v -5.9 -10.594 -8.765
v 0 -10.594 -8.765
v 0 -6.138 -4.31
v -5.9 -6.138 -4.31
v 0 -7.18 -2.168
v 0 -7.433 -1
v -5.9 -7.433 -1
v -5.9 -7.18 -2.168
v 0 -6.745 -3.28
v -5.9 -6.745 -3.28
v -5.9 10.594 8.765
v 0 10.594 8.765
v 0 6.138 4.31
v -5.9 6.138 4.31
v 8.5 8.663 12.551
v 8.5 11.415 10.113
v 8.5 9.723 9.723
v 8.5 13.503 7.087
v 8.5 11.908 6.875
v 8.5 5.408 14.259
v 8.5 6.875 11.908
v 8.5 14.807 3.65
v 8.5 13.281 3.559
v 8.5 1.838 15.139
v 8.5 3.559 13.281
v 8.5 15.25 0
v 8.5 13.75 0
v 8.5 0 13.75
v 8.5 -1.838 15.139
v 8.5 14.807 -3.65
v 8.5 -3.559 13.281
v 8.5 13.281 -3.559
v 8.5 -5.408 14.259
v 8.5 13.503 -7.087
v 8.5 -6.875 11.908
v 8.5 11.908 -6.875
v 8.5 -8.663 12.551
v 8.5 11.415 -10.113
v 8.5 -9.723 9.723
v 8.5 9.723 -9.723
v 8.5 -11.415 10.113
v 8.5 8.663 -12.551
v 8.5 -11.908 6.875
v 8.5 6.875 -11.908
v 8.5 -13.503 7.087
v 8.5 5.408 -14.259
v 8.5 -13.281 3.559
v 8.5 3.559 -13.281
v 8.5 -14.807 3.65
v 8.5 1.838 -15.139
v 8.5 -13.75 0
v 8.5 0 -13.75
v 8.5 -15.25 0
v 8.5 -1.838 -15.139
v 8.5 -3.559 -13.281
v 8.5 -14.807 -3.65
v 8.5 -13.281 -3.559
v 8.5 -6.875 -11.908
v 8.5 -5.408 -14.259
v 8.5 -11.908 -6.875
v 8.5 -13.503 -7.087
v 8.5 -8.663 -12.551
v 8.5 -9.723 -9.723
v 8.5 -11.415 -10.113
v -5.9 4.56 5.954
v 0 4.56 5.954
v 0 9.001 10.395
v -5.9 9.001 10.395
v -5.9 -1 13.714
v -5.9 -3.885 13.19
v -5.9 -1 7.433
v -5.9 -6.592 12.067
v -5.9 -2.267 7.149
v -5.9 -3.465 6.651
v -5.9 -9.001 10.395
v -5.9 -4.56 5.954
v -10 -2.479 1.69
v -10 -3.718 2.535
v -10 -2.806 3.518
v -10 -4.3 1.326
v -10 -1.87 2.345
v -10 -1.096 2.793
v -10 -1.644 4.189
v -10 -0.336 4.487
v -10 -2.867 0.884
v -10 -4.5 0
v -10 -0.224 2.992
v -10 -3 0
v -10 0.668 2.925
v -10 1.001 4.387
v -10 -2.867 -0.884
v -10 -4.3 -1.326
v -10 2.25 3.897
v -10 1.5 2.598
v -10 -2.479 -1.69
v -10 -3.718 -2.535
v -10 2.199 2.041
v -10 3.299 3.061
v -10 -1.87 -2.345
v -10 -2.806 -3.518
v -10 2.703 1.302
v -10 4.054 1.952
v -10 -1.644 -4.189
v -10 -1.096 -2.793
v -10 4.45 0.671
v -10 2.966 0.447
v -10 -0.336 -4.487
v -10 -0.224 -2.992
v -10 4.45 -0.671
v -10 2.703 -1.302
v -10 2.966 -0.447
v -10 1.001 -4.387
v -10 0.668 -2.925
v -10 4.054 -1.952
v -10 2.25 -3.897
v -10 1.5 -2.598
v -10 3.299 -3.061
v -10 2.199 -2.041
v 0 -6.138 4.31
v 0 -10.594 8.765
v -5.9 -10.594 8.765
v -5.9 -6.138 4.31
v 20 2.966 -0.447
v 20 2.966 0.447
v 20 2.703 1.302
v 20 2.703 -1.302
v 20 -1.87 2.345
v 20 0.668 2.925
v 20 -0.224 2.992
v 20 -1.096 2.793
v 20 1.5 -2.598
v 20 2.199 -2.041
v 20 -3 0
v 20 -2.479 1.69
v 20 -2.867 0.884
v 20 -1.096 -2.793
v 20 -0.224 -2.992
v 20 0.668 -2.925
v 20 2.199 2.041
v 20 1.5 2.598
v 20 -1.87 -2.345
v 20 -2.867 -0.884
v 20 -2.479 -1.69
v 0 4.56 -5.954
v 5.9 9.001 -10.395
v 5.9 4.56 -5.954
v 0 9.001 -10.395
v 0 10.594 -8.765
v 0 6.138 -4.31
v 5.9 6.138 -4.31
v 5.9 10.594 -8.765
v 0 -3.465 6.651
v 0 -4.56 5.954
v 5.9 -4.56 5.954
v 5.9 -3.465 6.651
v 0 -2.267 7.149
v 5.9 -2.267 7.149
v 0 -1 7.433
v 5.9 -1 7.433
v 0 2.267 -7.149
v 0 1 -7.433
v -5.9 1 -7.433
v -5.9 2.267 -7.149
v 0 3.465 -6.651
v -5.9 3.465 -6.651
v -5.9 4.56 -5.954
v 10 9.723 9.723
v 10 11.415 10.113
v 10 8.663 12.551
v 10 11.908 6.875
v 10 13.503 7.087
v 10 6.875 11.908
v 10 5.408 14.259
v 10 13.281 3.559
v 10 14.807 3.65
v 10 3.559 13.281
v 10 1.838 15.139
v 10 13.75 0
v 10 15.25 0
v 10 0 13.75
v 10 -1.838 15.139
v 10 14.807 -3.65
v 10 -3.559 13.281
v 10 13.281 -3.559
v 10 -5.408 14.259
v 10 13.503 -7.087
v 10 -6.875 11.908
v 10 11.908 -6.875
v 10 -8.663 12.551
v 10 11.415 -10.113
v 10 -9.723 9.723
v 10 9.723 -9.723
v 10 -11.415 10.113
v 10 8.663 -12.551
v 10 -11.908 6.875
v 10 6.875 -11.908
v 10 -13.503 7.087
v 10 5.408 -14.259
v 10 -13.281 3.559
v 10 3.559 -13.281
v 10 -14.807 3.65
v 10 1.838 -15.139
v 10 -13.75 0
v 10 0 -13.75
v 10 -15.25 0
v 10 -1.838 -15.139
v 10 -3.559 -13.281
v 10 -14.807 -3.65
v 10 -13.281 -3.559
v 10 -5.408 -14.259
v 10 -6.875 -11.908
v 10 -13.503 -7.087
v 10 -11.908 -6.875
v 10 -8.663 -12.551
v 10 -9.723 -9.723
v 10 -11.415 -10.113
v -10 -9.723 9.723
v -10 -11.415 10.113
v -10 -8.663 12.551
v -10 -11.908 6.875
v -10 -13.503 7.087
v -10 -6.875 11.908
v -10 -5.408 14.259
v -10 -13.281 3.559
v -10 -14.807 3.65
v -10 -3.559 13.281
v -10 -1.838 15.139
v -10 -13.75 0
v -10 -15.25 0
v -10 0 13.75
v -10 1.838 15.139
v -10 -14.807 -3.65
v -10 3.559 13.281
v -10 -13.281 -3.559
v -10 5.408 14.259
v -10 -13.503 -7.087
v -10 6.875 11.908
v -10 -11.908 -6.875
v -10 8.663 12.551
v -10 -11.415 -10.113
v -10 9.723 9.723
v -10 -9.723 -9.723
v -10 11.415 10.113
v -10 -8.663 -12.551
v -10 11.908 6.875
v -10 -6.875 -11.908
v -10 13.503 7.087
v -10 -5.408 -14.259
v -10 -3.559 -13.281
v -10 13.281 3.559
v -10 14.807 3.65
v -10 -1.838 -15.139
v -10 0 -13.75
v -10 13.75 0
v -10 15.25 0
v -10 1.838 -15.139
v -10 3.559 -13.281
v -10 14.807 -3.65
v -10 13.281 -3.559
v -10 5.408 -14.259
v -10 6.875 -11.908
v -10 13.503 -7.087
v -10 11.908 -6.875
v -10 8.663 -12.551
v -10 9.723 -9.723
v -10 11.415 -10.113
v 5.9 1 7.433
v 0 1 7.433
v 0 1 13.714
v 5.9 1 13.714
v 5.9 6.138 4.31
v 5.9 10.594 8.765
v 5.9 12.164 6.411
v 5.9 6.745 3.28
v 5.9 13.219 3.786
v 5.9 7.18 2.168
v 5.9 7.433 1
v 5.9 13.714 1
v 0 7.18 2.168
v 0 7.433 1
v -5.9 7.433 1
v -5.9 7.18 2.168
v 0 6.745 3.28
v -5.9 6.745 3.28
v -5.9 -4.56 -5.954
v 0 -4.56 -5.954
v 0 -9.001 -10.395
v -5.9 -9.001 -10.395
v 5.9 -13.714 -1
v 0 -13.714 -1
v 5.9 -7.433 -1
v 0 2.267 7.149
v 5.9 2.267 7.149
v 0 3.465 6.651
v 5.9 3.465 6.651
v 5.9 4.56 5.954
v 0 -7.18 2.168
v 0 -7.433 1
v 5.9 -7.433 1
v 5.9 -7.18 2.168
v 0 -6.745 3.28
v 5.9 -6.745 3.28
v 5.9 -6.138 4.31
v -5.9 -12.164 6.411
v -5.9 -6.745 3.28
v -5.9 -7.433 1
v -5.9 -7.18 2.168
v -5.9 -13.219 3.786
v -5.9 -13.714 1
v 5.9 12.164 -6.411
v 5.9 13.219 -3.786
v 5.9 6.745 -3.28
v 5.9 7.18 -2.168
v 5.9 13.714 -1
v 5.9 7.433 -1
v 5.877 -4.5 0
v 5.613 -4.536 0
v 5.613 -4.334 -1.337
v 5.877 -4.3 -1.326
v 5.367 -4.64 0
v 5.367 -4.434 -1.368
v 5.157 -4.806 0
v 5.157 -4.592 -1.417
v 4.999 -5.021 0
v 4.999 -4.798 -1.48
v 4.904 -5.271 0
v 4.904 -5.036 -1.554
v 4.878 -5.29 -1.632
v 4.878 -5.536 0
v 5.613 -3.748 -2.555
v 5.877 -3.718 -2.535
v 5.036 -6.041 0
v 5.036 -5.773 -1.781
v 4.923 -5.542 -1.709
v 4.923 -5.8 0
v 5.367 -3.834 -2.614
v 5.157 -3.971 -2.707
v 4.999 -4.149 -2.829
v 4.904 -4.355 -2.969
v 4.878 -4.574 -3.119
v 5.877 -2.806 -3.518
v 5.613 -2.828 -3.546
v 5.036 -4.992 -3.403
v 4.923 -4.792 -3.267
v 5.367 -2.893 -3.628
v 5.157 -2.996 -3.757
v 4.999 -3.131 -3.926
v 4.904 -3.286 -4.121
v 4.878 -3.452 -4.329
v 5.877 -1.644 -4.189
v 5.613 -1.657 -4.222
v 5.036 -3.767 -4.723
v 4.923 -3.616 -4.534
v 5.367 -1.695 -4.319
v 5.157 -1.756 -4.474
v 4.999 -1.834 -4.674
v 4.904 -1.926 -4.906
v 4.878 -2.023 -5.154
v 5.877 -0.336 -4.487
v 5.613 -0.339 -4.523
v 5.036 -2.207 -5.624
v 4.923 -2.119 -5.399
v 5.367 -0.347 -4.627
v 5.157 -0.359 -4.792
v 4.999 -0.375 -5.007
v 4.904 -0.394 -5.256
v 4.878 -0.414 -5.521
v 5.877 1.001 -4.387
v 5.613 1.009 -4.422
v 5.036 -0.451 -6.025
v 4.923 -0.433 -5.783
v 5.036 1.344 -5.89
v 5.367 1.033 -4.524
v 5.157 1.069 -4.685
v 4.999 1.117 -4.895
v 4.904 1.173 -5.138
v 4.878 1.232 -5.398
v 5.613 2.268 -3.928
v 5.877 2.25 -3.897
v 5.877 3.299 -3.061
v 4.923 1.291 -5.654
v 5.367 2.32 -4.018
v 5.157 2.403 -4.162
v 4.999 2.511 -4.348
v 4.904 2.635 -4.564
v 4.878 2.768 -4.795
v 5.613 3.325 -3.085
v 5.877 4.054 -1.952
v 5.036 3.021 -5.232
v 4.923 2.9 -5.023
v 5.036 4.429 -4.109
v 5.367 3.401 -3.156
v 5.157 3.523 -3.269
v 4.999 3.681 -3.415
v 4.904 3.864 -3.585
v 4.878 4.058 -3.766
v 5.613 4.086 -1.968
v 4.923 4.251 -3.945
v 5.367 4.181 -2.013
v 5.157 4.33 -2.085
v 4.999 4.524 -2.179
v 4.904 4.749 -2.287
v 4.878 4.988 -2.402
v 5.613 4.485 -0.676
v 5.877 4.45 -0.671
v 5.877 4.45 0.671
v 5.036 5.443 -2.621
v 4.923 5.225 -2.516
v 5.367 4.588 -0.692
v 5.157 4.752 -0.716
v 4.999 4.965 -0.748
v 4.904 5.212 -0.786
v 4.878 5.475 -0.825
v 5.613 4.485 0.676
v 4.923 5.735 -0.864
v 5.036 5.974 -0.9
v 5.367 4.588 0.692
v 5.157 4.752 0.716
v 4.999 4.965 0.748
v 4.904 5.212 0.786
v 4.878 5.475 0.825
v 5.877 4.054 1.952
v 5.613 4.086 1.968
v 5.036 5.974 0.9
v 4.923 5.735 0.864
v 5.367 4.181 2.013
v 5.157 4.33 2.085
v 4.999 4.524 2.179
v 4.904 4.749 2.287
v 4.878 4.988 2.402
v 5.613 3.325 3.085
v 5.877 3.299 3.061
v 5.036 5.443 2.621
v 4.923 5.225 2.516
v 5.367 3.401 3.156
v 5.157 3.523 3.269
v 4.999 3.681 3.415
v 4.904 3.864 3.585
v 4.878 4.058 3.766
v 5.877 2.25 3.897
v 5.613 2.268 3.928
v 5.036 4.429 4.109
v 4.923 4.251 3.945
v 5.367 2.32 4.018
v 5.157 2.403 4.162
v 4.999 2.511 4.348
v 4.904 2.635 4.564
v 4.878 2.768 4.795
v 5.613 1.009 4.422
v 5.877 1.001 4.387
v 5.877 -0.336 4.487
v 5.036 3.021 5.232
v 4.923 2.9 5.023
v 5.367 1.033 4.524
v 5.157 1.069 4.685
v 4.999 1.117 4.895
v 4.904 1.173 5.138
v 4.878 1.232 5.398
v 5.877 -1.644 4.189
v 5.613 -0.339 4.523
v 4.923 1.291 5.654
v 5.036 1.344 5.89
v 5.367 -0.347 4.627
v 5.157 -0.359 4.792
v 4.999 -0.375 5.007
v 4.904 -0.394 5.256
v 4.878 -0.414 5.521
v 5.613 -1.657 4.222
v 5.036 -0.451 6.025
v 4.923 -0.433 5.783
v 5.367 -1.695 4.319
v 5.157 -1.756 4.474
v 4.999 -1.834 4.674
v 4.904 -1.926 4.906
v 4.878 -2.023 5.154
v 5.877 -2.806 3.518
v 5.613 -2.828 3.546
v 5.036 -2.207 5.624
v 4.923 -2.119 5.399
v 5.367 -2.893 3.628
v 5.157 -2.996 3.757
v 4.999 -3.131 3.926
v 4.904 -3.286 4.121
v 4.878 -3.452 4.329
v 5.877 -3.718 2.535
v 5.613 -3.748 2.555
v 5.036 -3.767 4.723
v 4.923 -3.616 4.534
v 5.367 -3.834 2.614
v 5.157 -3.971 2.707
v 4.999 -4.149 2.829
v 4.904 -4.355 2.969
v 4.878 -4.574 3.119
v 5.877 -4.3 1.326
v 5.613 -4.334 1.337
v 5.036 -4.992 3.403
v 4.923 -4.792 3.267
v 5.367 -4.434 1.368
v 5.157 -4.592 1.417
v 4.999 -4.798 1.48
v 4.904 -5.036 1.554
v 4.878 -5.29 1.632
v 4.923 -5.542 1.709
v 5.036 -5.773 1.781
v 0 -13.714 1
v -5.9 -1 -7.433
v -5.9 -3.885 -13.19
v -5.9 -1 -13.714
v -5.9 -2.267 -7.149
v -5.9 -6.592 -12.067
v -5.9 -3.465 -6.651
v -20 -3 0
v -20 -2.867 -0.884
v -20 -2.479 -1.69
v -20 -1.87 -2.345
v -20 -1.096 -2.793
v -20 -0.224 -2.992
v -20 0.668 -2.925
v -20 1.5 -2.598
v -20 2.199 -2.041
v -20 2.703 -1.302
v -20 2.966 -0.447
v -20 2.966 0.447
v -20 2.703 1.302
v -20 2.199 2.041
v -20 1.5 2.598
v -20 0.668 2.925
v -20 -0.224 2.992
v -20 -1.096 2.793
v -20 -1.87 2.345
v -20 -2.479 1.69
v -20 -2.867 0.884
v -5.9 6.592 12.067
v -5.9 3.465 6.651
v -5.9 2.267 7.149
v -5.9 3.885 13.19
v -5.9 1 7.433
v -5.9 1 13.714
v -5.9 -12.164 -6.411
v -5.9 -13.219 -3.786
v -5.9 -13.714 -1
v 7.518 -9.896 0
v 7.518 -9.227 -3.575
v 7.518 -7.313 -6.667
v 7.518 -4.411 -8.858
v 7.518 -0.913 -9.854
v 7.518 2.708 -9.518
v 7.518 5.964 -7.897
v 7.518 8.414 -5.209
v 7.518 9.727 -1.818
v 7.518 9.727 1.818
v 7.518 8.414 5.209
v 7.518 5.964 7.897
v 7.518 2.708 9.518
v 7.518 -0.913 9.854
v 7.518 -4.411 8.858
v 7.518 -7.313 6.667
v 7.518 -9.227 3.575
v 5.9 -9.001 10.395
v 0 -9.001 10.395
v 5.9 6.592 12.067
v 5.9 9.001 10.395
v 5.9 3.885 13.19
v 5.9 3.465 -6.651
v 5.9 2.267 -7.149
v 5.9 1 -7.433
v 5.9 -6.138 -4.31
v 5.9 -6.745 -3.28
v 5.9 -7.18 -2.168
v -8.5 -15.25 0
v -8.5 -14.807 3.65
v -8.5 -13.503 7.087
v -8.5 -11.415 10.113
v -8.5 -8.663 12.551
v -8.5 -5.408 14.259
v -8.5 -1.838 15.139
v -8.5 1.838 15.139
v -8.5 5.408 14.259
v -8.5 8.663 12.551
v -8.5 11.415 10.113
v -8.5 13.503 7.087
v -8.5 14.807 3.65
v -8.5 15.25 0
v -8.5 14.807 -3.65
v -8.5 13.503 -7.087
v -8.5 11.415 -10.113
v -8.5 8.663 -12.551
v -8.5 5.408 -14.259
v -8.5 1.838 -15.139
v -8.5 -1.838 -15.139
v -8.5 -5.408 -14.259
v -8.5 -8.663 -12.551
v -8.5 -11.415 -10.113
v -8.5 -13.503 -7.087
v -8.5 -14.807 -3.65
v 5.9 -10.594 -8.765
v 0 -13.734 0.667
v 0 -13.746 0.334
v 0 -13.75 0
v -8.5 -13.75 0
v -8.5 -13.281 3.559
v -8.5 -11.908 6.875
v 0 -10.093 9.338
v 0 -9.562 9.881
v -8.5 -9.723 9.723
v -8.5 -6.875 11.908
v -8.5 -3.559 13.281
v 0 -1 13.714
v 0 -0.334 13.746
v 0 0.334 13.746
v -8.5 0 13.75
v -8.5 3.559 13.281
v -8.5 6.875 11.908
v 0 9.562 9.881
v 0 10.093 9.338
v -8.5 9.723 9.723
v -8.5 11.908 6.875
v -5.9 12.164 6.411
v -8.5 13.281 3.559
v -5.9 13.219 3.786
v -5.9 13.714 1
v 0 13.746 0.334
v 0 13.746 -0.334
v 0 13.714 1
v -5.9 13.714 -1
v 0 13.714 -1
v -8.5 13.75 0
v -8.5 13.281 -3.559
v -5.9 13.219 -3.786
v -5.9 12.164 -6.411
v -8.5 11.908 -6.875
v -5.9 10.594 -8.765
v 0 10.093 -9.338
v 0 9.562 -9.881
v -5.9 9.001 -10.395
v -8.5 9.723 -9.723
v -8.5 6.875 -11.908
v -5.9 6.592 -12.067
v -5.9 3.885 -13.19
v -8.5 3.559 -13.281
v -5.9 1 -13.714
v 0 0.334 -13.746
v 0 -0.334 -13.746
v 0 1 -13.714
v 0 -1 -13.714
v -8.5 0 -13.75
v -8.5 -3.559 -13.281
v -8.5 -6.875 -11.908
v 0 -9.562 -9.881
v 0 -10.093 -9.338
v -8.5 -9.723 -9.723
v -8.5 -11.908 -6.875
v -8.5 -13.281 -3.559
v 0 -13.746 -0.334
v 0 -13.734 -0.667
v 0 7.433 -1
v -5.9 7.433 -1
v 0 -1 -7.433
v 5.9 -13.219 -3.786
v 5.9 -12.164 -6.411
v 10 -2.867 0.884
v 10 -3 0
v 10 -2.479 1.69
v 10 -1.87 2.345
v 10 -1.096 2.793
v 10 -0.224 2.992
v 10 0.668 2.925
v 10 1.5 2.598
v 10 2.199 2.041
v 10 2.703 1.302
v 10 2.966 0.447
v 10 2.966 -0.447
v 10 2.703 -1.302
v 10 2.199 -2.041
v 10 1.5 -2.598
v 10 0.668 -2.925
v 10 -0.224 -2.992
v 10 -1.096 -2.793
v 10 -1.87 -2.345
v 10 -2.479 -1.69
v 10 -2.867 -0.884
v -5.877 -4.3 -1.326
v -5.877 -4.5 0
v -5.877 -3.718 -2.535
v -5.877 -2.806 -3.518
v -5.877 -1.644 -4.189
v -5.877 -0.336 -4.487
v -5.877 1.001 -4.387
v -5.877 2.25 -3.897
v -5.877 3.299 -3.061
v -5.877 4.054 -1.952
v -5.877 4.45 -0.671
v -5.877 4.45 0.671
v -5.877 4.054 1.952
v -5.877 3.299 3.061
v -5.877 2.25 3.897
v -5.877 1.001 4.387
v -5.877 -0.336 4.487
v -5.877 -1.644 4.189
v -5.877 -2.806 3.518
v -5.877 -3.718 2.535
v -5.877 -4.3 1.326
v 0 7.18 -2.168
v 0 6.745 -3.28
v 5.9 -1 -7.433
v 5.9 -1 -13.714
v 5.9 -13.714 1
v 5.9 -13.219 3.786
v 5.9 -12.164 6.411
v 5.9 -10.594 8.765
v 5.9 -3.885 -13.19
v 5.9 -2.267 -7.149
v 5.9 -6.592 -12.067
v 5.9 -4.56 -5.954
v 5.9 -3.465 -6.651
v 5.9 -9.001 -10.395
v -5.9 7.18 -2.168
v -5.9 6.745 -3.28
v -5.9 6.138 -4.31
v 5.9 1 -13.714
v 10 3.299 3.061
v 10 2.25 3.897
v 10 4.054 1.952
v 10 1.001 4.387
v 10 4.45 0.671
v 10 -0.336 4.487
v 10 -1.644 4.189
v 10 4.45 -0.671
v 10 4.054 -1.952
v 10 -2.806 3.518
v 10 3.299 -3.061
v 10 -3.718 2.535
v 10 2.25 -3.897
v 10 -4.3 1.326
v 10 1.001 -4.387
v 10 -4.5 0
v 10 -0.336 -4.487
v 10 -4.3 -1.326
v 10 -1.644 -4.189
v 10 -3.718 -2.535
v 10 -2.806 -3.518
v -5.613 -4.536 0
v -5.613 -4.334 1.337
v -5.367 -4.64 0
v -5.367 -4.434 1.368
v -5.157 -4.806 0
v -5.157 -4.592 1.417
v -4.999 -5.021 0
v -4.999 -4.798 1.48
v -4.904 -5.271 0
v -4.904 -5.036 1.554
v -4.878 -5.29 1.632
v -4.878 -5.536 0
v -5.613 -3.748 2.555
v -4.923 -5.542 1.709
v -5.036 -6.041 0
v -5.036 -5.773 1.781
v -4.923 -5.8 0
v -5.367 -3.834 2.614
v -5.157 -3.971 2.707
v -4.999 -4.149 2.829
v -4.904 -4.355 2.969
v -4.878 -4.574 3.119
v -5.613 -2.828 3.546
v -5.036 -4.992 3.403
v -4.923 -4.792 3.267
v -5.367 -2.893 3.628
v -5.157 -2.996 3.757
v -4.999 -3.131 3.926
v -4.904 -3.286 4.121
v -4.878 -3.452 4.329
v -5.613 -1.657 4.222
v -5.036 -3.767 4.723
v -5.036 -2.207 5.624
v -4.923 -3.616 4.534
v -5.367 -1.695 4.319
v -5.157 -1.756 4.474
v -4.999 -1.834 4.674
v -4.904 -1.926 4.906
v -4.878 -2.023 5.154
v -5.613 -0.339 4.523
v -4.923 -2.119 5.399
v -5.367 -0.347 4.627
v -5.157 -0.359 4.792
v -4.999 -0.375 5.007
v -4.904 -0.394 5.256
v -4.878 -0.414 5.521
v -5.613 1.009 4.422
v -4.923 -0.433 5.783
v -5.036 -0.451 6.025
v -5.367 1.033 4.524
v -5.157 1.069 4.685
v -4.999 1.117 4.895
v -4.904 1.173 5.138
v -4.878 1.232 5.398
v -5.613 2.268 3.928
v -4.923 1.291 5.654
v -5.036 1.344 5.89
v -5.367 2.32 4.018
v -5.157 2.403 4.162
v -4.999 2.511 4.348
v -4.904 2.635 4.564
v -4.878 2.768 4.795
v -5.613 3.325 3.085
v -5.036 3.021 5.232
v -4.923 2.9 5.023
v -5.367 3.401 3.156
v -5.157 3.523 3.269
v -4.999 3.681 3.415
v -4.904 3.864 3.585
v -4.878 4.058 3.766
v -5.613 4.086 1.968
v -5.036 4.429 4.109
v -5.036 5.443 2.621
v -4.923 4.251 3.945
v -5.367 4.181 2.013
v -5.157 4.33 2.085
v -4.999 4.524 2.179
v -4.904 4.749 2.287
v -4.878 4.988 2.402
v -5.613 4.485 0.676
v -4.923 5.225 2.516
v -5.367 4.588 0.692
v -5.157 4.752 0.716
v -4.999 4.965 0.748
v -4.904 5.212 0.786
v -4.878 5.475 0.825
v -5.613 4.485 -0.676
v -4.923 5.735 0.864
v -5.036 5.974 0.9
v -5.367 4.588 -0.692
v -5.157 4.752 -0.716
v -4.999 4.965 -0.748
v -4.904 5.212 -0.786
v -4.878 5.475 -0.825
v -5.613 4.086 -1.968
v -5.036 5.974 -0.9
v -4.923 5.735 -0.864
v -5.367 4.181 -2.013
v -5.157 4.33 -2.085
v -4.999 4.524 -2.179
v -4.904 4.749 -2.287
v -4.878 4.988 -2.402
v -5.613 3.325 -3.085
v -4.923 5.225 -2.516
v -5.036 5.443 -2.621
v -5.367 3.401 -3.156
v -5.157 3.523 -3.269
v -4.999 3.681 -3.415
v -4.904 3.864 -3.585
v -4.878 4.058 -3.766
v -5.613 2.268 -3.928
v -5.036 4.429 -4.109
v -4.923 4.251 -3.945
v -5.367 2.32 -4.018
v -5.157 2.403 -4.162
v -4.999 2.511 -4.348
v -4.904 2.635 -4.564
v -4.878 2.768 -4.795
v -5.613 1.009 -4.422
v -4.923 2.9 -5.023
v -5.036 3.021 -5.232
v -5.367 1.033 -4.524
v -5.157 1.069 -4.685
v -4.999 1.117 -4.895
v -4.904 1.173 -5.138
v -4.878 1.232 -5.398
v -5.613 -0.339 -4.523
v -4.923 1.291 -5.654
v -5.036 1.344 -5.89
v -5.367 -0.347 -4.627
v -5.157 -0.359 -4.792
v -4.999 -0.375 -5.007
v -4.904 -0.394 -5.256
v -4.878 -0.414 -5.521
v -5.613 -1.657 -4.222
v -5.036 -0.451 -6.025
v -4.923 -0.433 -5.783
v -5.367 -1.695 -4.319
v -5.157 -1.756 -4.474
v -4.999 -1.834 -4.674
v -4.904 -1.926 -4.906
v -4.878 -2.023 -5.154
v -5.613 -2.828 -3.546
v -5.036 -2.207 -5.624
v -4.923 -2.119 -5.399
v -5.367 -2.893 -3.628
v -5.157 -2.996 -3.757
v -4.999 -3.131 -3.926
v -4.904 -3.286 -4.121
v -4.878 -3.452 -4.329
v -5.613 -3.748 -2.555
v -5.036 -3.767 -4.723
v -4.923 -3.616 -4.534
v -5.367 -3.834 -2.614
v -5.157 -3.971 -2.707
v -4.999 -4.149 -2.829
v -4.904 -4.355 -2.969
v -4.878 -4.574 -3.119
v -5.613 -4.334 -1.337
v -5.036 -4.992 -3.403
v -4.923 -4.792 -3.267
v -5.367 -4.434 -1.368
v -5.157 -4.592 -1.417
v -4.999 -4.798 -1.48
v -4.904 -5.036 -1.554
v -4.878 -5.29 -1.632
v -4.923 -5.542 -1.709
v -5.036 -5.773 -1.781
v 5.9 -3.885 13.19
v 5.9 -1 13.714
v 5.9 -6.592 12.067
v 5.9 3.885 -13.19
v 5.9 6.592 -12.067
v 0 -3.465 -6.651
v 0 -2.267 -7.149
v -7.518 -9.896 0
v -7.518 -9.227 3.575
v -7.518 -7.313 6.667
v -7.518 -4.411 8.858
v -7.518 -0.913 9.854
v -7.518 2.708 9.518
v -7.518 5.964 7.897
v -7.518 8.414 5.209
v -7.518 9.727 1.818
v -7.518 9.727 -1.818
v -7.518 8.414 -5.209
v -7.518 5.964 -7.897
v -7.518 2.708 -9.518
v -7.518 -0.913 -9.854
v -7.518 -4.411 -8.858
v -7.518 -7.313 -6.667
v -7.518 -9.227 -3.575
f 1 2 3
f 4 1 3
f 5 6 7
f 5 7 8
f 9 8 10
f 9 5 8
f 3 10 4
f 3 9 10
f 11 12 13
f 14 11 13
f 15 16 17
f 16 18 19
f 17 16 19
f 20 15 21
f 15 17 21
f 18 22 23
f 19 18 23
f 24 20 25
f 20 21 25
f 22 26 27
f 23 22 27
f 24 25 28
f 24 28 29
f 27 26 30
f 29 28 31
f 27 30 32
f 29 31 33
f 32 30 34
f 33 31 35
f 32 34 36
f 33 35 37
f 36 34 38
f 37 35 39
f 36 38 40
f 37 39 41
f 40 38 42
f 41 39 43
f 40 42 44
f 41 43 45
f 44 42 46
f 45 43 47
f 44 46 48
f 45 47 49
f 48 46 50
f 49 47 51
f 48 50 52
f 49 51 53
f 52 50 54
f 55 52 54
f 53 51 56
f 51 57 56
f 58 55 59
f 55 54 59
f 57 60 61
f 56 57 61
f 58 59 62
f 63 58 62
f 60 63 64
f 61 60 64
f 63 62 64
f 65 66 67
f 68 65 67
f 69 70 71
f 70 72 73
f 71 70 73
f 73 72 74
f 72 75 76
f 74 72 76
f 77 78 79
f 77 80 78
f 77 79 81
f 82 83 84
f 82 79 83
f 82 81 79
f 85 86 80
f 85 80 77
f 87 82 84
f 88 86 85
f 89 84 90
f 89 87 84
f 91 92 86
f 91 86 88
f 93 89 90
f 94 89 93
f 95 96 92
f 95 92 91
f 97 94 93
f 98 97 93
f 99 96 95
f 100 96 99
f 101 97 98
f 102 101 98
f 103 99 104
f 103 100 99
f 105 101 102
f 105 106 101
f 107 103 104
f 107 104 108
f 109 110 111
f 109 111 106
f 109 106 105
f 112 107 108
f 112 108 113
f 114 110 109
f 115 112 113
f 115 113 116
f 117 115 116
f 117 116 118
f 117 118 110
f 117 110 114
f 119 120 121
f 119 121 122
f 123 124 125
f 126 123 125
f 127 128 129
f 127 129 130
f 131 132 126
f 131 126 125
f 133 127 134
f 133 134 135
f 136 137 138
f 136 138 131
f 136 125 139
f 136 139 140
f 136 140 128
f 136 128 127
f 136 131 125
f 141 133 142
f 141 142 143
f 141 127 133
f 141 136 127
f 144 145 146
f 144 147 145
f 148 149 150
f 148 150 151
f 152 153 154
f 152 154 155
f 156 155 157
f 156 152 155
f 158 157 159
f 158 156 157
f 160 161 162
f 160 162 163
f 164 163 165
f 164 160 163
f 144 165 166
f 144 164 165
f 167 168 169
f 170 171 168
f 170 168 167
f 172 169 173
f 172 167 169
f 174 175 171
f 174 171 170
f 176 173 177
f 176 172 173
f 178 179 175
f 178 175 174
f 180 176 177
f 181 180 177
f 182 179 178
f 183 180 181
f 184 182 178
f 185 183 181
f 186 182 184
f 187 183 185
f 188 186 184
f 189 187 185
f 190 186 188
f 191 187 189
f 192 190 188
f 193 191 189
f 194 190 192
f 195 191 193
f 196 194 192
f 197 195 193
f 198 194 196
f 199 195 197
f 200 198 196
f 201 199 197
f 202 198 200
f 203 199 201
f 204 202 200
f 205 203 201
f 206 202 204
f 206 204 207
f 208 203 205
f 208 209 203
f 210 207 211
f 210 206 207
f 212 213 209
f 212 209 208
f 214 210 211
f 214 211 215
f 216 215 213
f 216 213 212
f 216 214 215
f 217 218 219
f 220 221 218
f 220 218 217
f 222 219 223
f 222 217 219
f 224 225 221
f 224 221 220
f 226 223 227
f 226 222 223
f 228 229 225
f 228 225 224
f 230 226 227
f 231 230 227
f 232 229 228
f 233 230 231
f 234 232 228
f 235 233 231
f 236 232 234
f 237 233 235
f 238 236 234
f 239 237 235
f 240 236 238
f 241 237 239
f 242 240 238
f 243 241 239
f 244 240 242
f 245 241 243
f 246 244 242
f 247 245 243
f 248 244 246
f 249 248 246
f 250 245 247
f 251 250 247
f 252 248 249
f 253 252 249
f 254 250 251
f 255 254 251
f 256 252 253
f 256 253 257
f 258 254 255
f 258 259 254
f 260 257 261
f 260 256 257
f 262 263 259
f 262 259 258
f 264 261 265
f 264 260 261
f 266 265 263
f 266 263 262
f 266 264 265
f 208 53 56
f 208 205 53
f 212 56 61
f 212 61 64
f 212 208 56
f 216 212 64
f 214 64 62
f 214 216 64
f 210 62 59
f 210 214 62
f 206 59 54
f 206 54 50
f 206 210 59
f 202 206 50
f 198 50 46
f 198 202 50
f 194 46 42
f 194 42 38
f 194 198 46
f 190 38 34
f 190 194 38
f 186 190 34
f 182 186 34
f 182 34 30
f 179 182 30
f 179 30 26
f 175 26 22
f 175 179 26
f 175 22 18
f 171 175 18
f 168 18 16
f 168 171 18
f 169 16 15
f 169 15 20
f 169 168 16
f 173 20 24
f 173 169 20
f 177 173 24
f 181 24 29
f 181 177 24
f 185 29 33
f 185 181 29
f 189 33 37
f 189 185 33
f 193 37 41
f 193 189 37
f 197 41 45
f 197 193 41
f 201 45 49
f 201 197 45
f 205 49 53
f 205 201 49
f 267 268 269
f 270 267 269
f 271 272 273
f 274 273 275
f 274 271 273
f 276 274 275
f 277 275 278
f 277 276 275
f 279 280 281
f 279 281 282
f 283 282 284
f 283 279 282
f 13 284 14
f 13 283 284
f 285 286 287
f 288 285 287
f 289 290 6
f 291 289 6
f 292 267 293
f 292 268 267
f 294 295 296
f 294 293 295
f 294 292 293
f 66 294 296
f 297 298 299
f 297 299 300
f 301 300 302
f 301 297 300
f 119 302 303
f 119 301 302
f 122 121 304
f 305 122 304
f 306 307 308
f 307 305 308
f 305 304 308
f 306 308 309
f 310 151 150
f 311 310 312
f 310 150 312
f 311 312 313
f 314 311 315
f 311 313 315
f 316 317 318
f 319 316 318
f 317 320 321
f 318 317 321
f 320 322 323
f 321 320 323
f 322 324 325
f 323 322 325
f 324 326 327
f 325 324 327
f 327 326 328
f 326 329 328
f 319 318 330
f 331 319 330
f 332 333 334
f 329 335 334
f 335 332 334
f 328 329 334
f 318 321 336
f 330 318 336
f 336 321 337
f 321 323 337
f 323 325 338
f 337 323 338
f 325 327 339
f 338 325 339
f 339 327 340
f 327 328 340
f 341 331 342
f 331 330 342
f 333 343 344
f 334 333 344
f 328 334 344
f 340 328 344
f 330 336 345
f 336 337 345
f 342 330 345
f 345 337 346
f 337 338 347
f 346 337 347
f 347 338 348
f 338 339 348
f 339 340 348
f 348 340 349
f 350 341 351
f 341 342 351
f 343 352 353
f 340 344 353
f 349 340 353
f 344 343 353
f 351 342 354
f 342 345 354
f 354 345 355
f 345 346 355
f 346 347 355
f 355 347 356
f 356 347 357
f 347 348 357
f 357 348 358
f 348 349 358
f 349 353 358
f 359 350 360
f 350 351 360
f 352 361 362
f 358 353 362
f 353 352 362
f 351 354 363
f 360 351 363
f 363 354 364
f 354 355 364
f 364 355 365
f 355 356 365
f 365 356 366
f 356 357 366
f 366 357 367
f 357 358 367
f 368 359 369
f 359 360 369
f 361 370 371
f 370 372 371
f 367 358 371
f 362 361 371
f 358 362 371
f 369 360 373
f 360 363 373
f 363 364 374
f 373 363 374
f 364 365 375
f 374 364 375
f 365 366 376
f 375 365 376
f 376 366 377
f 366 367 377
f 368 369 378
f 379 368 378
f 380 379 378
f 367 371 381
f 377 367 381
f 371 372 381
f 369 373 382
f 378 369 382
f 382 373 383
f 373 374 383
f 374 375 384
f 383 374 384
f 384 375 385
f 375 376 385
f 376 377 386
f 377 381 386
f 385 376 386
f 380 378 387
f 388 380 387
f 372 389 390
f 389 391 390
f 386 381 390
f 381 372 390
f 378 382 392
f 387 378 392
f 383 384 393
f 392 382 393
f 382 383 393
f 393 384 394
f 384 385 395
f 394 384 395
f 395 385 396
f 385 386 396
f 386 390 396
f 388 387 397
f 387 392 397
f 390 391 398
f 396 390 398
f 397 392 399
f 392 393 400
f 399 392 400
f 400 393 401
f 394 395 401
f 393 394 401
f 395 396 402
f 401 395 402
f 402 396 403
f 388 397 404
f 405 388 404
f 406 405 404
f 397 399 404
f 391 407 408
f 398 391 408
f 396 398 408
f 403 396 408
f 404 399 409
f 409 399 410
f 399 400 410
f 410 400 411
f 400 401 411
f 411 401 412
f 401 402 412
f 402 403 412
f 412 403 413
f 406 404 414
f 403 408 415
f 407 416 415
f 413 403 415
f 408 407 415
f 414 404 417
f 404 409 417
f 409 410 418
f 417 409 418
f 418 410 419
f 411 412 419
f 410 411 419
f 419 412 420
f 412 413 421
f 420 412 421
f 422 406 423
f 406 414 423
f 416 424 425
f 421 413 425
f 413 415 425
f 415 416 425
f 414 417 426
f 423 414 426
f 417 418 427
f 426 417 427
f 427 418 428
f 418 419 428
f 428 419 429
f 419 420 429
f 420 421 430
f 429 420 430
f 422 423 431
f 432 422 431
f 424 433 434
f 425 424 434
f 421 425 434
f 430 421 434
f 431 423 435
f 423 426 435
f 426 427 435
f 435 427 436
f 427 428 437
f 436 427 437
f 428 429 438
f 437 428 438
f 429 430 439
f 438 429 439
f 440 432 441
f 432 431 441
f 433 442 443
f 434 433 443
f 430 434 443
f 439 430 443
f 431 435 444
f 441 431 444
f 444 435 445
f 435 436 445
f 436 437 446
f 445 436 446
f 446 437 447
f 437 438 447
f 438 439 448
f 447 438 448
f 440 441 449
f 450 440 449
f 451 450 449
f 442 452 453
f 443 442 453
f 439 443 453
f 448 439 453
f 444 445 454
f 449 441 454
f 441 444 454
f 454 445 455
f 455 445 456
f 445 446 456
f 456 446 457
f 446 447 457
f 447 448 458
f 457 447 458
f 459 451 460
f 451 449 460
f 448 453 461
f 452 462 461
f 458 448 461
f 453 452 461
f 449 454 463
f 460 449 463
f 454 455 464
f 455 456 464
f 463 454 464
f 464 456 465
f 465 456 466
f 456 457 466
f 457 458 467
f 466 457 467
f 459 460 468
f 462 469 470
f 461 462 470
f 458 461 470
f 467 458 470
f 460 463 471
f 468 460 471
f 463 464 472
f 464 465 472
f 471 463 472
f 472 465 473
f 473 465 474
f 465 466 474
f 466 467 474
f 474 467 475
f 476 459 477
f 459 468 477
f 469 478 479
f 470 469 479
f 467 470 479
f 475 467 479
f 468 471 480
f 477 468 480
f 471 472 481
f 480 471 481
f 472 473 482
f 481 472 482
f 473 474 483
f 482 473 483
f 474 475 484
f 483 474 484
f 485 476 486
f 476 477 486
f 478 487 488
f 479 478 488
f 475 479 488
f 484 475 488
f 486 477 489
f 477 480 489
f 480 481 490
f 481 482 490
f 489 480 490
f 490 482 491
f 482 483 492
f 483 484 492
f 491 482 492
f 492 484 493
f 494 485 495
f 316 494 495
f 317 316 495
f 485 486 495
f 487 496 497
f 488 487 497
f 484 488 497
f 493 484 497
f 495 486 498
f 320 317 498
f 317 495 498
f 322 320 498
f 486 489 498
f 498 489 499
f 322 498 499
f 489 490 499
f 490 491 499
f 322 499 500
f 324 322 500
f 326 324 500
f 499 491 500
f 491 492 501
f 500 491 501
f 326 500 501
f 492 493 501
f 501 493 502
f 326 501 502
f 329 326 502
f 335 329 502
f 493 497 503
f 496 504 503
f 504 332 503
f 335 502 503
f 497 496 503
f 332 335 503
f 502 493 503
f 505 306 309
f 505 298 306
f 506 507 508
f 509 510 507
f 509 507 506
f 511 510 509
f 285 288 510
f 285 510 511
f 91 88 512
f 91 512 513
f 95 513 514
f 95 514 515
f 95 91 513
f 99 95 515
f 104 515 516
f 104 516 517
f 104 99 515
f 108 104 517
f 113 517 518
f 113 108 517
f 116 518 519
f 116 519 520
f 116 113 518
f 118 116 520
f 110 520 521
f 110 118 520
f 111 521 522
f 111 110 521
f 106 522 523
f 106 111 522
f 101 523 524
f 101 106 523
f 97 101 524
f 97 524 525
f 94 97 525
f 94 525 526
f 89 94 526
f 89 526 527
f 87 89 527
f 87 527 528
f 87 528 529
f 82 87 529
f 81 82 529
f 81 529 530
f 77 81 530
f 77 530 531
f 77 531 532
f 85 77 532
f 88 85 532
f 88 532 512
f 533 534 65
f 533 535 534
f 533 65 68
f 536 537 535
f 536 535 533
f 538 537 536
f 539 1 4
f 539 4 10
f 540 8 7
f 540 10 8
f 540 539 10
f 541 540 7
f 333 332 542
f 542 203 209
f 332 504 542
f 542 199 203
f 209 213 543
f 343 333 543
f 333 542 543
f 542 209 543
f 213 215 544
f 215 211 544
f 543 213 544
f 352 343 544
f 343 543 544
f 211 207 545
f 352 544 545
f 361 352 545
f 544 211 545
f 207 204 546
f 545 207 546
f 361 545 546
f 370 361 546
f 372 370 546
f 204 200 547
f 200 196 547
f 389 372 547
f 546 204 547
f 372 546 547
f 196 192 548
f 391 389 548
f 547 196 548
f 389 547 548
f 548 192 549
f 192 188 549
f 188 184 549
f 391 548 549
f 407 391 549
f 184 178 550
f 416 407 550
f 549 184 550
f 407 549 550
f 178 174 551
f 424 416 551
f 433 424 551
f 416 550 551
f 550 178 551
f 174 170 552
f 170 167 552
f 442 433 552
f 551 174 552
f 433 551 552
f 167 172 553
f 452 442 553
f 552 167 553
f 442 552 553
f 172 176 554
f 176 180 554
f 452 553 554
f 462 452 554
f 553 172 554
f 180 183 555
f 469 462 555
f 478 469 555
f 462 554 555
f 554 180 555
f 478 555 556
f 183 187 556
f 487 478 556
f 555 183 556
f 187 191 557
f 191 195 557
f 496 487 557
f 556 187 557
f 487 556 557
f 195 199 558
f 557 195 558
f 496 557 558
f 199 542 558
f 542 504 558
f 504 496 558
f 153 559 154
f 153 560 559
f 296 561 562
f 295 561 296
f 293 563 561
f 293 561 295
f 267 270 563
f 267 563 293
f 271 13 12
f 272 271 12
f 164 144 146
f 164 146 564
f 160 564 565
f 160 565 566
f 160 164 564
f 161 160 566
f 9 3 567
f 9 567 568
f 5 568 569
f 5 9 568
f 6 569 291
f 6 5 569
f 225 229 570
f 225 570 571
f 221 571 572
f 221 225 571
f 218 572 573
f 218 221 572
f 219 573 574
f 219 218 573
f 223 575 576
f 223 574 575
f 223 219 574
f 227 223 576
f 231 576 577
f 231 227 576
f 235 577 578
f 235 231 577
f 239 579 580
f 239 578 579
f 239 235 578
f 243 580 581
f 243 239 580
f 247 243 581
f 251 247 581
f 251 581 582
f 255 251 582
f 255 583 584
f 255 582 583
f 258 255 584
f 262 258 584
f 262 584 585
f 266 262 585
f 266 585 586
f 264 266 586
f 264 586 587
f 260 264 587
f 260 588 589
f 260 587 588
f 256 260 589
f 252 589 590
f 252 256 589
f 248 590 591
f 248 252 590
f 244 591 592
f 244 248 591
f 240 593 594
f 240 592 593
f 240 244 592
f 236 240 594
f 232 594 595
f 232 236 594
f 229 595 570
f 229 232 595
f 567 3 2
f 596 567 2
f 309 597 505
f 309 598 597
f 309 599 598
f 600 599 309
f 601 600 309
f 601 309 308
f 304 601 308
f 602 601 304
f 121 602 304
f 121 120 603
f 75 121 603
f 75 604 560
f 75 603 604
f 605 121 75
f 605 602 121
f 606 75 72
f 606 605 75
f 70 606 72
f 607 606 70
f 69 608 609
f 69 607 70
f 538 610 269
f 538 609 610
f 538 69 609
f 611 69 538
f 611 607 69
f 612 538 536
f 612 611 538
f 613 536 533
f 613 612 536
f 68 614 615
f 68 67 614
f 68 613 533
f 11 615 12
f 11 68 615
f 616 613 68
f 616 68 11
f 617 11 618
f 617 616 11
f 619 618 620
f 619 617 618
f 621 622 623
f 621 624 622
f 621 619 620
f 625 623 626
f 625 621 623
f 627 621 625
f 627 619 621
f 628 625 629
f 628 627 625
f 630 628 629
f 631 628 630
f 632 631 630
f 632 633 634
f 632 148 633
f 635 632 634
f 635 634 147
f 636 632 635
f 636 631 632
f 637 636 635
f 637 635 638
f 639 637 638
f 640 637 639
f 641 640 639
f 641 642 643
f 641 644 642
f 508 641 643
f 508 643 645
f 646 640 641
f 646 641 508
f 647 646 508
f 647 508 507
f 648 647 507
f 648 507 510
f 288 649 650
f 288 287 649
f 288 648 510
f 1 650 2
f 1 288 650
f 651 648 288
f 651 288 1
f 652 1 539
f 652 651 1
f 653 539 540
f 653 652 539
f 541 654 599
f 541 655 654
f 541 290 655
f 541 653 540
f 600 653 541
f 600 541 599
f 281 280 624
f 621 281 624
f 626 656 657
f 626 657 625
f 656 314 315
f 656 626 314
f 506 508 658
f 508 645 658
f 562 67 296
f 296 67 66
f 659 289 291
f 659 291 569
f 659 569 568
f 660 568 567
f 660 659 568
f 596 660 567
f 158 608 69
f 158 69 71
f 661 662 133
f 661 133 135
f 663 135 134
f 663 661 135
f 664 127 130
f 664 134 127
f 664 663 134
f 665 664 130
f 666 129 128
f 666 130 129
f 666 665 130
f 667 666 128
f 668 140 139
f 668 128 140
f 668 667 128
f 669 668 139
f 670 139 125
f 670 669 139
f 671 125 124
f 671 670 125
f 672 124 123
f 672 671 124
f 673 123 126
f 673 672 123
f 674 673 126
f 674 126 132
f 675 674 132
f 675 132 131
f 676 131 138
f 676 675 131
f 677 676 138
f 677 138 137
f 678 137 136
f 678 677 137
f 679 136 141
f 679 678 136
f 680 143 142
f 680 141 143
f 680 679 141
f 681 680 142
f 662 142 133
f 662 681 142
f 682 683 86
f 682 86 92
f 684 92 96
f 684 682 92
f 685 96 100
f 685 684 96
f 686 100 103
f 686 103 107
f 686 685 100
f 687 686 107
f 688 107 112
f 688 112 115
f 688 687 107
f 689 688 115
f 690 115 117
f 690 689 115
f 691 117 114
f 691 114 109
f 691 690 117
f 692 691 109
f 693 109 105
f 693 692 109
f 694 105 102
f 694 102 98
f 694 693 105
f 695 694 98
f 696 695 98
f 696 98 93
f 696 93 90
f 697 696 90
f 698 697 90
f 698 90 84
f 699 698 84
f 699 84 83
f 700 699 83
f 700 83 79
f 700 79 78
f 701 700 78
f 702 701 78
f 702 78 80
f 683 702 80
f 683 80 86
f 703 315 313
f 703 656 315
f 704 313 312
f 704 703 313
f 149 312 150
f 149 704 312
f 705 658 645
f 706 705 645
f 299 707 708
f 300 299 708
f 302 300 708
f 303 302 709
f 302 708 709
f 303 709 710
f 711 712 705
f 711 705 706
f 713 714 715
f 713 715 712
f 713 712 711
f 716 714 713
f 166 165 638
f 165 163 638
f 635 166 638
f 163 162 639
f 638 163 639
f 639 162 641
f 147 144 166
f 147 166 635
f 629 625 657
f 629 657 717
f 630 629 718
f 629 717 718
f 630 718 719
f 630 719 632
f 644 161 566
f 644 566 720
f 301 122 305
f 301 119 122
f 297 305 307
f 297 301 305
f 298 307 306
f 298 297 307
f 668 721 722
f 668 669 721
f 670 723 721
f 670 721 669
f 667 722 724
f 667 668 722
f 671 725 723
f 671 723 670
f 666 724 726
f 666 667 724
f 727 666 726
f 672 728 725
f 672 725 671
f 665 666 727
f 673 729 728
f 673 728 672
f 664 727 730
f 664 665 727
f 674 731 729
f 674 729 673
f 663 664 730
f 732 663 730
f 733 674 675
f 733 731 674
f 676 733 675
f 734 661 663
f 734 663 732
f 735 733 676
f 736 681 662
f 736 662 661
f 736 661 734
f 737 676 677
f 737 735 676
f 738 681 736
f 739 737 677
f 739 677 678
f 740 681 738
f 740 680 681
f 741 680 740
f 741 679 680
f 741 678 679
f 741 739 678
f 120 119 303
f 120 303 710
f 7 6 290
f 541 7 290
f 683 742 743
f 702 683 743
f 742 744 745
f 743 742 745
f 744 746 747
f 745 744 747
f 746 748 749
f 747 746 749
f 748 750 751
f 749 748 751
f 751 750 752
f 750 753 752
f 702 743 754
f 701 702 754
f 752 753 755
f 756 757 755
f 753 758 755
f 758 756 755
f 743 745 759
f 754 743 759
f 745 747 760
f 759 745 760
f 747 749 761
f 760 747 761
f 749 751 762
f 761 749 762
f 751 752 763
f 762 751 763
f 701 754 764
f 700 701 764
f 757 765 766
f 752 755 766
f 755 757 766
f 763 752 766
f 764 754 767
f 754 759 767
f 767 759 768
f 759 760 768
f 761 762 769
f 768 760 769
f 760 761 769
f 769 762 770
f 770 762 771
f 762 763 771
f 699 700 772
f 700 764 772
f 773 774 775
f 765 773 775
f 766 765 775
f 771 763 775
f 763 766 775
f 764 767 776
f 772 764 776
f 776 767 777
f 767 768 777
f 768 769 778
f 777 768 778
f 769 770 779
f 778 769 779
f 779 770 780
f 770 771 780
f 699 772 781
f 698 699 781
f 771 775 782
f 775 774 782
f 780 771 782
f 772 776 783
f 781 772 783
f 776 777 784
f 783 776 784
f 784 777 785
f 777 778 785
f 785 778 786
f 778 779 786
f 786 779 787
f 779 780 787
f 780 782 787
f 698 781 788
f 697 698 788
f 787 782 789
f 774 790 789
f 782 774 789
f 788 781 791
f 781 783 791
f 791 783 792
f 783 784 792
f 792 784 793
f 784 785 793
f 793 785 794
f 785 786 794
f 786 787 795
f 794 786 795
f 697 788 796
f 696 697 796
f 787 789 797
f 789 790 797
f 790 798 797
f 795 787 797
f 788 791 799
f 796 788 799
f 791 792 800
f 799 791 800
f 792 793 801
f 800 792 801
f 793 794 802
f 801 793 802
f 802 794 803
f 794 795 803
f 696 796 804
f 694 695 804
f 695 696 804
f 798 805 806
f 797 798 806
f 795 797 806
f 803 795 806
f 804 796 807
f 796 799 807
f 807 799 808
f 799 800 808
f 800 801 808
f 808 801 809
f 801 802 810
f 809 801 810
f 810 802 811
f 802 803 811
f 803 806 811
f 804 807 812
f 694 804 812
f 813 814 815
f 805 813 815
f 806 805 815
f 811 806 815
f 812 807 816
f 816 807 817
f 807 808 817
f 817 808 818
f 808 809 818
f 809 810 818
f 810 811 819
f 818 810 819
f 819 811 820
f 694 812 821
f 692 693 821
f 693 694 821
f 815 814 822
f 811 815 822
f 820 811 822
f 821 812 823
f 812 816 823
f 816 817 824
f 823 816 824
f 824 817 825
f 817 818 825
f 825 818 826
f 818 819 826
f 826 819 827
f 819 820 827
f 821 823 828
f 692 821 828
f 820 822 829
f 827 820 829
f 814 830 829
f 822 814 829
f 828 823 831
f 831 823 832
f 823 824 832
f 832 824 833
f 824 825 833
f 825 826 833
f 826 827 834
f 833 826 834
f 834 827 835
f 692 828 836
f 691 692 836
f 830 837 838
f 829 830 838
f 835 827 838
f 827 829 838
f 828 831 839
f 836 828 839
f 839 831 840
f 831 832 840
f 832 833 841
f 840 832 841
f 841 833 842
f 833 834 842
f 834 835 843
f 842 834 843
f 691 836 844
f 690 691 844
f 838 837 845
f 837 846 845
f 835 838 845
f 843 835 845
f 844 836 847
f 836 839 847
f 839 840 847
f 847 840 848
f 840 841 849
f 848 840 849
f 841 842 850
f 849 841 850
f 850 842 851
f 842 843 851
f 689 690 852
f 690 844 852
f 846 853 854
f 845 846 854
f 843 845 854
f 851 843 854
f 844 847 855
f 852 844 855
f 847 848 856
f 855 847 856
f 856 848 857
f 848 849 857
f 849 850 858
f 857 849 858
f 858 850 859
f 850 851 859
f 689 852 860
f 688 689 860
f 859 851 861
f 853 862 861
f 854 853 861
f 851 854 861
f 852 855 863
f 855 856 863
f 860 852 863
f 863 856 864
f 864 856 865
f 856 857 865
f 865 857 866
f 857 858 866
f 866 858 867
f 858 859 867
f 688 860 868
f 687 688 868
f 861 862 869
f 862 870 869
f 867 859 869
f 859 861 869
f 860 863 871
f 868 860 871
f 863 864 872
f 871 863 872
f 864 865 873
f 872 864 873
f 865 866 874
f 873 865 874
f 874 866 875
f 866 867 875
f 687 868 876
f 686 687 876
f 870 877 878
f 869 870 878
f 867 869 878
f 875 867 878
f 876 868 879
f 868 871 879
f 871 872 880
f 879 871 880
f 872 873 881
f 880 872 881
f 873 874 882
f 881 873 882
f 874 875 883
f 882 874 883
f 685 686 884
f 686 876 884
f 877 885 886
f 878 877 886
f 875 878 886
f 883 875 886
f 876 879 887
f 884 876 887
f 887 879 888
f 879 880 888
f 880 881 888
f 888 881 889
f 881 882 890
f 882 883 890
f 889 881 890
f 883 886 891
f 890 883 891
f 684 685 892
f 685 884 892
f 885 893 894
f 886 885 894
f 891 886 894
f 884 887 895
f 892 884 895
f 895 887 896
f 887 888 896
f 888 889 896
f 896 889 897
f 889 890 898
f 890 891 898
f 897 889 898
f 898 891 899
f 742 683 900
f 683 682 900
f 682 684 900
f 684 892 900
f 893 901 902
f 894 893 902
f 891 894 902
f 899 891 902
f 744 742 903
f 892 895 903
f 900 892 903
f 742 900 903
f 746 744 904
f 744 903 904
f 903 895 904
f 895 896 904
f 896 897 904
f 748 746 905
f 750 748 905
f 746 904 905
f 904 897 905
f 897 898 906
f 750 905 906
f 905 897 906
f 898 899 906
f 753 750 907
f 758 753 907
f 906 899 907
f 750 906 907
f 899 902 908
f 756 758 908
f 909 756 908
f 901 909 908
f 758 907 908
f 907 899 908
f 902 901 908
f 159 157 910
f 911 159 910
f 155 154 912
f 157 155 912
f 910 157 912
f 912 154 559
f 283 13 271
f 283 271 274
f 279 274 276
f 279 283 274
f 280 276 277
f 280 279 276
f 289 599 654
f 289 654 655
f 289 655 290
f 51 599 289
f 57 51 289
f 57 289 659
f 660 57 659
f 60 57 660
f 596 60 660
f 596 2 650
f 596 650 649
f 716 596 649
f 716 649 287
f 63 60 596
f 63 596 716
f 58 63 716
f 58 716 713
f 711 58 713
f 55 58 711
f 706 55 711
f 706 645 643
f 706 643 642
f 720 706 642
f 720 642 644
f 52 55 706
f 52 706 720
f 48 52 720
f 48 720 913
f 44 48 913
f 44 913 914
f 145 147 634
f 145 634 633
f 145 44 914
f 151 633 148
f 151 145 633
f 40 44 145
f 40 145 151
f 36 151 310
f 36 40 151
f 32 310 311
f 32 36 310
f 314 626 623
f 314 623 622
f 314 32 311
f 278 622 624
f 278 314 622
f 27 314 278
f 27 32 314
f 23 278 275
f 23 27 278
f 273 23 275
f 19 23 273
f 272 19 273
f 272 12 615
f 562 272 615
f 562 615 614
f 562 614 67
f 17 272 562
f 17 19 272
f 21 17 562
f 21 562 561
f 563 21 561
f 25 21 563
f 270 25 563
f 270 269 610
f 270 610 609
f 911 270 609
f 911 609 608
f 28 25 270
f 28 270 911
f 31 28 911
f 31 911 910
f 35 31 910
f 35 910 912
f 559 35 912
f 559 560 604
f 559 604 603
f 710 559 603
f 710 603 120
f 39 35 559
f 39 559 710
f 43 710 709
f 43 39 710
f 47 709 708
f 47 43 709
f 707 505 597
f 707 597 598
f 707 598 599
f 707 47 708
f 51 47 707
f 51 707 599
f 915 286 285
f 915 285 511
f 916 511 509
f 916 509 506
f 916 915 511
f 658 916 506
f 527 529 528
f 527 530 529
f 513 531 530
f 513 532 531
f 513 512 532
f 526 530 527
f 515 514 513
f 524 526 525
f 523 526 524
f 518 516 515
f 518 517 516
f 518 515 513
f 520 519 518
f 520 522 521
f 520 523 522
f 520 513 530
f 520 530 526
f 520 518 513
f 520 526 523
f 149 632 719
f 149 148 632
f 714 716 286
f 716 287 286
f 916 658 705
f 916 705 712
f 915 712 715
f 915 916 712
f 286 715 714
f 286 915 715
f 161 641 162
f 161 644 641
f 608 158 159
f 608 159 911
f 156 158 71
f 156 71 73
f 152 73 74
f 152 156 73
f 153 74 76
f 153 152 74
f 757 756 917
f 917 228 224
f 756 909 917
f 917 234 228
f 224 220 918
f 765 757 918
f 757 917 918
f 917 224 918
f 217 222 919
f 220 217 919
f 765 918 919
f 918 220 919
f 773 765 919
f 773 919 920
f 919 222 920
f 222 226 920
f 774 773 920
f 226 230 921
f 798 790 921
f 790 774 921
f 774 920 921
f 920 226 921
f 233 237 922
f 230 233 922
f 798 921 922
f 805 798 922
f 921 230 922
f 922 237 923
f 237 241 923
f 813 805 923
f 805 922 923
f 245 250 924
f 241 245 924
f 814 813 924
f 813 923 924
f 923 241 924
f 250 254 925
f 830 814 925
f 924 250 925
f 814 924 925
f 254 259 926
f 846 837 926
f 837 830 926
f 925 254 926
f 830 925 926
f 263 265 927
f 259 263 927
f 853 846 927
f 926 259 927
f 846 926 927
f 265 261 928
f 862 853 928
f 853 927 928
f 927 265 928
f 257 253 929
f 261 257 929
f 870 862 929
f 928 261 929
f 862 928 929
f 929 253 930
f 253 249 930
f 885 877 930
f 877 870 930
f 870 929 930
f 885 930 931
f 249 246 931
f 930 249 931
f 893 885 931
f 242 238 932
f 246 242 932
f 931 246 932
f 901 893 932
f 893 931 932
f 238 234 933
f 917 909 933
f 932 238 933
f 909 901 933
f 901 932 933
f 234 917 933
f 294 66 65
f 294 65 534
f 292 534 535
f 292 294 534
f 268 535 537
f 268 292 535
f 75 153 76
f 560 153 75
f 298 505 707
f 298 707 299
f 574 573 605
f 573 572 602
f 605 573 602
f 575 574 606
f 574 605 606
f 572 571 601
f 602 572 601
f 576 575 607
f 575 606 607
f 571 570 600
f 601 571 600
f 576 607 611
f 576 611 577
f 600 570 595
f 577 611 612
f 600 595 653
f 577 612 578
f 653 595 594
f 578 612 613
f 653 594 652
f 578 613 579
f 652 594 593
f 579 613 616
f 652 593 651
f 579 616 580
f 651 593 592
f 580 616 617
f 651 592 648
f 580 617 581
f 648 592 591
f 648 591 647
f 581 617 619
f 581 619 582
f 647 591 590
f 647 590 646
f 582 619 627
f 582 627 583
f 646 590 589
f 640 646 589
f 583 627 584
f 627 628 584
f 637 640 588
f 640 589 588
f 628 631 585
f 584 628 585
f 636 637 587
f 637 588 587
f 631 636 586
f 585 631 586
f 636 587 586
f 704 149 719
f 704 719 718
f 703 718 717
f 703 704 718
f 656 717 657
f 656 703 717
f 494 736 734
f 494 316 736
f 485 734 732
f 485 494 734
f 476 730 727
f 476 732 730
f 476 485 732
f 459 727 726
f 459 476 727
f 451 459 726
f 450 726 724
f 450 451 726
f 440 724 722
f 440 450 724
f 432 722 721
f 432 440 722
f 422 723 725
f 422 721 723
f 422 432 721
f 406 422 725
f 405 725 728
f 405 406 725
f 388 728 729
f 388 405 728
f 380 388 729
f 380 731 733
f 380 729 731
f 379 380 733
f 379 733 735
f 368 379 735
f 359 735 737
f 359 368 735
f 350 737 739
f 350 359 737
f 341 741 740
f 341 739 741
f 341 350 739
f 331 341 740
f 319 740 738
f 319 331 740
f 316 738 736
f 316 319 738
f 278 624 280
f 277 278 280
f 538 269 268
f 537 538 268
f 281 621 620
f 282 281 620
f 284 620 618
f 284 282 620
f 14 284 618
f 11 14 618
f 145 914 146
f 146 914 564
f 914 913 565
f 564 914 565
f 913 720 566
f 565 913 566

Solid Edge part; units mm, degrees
sketch "Sketch1" plane through (0, 0, 0) normal (0, 0, 1) x (1, 0, 0)
  line L0 (20, -3) -> (10, -3)
  line L1 (10, -3) -> (10, -4.5)
  line L2 (10, -4.5) -> (5.8772, -4.5)
  arc A0 (5.8772, -4.5) -> (5.0365, -6.0414) centre (5.8772, -5.5) ccw
  line L3 (5.0365, -6.0414) -> (10, -13.75)
  line L4 (10, -13.75) -> (10, -15.25)
  line L5 (8.5, -15.25) -> (10, -15.25)
  line L6 (8.5, -13.75) -> (8.5, -15.25)
  line L7 (0, -13.75) -> (8.5, -13.75)
  line L8 (0, 0) -> (0, -13.75)
  line L9 (0, 0) -> (20, 0)
  line L10 (20, 0) -> (20, -3)
revolve "RevolvedProtrusion1" add sketch "Sketch1" angle 360 about axis through (0, 0, 0) along (1, 0, 0)
sketch "Sketch2" plane through (0, 0, 0) normal (-1, 0, 0) x (0, 0, 1)
  line L0 (-7.433, 1) -> (-19.394, 1)
  line L1 (-19.394, 1) -> (-19.394, 18)
  line L2 (-19.394, 18) -> (-5.9543, 4.5603)
  arc A0 (-5.9543, 4.5603) -> (-7.433, 1) centre (0, 0) ccw
  line L3 (-7.433, -1) -> (-19.394, -1)
  line L4 (-19.394, -1) -> (-19.394, -18)
  line L5 (-19.394, -18) -> (-5.9543, -4.5603)
  arc A1 (-5.9543, -4.5603) -> (-7.433, -1) centre (0, 0) cw
  line L6 (-4.3097, -6.1381) -> (-18, -19.8284)
  line L7 (-18, -19.8284) -> (-1, -19.8284)
  line L8 (-1, -19.8284) -> (-1, -7.433)
  arc A2 (-1, -7.433) -> (-4.3097, -6.1381) centre (0, 0) cw
  line L9 (1, -19.8284) -> (1, -7.433)
  arc A3 (1, -7.433) -> (4.3097, -6.1381) centre (0, 0) ccw
  line L10 (4.3097, -6.1381) -> (18, -19.8284)
  line L11 (18, -19.8284) -> (1, -19.8284)
  line L12 (19.394, -18) -> (5.9543, -4.5603)
  arc A4 (5.9543, -4.5603) -> (7.433, -1) centre (0, 0) ccw
  line L13 (7.433, -1) -> (19.394, -1)
  line L14 (19.394, -1) -> (19.394, -18)
  line L15 (7.433, 1) -> (19.394, 1)
  line L16 (19.394, 1) -> (19.394, 18)
  line L17 (19.394, 18) -> (5.9543, 4.5603)
  arc A5 (5.9543, 4.5603) -> (7.433, 1) centre (0, 0) cw
  line L18 (4.3097, 6.1381) -> (18, 19.8284)
  line L19 (18, 19.8284) -> (1, 19.8284)
  line L20 (1, 19.8284) -> (1, 7.433)
  arc A6 (1, 7.433) -> (4.3097, 6.1381) centre (0, 0) cw
  line L21 (-1, 19.8284) -> (-1, 7.433)
  arc A7 (-1, 7.433) -> (-4.3097, 6.1381) centre (0, 0) ccw
  line L22 (-4.3097, 6.1381) -> (-18, 19.8284)
  line L23 (-18, 19.8284) -> (-1, 19.8284)
extrude "Cutout1" cut sketch "Sketch2" against normal blind 5.9
mirror "Mirror1" about plane through (0, 0, 0) normal (1, 0, 0) of "RevolvedProtrusion1", "Cutout1"
